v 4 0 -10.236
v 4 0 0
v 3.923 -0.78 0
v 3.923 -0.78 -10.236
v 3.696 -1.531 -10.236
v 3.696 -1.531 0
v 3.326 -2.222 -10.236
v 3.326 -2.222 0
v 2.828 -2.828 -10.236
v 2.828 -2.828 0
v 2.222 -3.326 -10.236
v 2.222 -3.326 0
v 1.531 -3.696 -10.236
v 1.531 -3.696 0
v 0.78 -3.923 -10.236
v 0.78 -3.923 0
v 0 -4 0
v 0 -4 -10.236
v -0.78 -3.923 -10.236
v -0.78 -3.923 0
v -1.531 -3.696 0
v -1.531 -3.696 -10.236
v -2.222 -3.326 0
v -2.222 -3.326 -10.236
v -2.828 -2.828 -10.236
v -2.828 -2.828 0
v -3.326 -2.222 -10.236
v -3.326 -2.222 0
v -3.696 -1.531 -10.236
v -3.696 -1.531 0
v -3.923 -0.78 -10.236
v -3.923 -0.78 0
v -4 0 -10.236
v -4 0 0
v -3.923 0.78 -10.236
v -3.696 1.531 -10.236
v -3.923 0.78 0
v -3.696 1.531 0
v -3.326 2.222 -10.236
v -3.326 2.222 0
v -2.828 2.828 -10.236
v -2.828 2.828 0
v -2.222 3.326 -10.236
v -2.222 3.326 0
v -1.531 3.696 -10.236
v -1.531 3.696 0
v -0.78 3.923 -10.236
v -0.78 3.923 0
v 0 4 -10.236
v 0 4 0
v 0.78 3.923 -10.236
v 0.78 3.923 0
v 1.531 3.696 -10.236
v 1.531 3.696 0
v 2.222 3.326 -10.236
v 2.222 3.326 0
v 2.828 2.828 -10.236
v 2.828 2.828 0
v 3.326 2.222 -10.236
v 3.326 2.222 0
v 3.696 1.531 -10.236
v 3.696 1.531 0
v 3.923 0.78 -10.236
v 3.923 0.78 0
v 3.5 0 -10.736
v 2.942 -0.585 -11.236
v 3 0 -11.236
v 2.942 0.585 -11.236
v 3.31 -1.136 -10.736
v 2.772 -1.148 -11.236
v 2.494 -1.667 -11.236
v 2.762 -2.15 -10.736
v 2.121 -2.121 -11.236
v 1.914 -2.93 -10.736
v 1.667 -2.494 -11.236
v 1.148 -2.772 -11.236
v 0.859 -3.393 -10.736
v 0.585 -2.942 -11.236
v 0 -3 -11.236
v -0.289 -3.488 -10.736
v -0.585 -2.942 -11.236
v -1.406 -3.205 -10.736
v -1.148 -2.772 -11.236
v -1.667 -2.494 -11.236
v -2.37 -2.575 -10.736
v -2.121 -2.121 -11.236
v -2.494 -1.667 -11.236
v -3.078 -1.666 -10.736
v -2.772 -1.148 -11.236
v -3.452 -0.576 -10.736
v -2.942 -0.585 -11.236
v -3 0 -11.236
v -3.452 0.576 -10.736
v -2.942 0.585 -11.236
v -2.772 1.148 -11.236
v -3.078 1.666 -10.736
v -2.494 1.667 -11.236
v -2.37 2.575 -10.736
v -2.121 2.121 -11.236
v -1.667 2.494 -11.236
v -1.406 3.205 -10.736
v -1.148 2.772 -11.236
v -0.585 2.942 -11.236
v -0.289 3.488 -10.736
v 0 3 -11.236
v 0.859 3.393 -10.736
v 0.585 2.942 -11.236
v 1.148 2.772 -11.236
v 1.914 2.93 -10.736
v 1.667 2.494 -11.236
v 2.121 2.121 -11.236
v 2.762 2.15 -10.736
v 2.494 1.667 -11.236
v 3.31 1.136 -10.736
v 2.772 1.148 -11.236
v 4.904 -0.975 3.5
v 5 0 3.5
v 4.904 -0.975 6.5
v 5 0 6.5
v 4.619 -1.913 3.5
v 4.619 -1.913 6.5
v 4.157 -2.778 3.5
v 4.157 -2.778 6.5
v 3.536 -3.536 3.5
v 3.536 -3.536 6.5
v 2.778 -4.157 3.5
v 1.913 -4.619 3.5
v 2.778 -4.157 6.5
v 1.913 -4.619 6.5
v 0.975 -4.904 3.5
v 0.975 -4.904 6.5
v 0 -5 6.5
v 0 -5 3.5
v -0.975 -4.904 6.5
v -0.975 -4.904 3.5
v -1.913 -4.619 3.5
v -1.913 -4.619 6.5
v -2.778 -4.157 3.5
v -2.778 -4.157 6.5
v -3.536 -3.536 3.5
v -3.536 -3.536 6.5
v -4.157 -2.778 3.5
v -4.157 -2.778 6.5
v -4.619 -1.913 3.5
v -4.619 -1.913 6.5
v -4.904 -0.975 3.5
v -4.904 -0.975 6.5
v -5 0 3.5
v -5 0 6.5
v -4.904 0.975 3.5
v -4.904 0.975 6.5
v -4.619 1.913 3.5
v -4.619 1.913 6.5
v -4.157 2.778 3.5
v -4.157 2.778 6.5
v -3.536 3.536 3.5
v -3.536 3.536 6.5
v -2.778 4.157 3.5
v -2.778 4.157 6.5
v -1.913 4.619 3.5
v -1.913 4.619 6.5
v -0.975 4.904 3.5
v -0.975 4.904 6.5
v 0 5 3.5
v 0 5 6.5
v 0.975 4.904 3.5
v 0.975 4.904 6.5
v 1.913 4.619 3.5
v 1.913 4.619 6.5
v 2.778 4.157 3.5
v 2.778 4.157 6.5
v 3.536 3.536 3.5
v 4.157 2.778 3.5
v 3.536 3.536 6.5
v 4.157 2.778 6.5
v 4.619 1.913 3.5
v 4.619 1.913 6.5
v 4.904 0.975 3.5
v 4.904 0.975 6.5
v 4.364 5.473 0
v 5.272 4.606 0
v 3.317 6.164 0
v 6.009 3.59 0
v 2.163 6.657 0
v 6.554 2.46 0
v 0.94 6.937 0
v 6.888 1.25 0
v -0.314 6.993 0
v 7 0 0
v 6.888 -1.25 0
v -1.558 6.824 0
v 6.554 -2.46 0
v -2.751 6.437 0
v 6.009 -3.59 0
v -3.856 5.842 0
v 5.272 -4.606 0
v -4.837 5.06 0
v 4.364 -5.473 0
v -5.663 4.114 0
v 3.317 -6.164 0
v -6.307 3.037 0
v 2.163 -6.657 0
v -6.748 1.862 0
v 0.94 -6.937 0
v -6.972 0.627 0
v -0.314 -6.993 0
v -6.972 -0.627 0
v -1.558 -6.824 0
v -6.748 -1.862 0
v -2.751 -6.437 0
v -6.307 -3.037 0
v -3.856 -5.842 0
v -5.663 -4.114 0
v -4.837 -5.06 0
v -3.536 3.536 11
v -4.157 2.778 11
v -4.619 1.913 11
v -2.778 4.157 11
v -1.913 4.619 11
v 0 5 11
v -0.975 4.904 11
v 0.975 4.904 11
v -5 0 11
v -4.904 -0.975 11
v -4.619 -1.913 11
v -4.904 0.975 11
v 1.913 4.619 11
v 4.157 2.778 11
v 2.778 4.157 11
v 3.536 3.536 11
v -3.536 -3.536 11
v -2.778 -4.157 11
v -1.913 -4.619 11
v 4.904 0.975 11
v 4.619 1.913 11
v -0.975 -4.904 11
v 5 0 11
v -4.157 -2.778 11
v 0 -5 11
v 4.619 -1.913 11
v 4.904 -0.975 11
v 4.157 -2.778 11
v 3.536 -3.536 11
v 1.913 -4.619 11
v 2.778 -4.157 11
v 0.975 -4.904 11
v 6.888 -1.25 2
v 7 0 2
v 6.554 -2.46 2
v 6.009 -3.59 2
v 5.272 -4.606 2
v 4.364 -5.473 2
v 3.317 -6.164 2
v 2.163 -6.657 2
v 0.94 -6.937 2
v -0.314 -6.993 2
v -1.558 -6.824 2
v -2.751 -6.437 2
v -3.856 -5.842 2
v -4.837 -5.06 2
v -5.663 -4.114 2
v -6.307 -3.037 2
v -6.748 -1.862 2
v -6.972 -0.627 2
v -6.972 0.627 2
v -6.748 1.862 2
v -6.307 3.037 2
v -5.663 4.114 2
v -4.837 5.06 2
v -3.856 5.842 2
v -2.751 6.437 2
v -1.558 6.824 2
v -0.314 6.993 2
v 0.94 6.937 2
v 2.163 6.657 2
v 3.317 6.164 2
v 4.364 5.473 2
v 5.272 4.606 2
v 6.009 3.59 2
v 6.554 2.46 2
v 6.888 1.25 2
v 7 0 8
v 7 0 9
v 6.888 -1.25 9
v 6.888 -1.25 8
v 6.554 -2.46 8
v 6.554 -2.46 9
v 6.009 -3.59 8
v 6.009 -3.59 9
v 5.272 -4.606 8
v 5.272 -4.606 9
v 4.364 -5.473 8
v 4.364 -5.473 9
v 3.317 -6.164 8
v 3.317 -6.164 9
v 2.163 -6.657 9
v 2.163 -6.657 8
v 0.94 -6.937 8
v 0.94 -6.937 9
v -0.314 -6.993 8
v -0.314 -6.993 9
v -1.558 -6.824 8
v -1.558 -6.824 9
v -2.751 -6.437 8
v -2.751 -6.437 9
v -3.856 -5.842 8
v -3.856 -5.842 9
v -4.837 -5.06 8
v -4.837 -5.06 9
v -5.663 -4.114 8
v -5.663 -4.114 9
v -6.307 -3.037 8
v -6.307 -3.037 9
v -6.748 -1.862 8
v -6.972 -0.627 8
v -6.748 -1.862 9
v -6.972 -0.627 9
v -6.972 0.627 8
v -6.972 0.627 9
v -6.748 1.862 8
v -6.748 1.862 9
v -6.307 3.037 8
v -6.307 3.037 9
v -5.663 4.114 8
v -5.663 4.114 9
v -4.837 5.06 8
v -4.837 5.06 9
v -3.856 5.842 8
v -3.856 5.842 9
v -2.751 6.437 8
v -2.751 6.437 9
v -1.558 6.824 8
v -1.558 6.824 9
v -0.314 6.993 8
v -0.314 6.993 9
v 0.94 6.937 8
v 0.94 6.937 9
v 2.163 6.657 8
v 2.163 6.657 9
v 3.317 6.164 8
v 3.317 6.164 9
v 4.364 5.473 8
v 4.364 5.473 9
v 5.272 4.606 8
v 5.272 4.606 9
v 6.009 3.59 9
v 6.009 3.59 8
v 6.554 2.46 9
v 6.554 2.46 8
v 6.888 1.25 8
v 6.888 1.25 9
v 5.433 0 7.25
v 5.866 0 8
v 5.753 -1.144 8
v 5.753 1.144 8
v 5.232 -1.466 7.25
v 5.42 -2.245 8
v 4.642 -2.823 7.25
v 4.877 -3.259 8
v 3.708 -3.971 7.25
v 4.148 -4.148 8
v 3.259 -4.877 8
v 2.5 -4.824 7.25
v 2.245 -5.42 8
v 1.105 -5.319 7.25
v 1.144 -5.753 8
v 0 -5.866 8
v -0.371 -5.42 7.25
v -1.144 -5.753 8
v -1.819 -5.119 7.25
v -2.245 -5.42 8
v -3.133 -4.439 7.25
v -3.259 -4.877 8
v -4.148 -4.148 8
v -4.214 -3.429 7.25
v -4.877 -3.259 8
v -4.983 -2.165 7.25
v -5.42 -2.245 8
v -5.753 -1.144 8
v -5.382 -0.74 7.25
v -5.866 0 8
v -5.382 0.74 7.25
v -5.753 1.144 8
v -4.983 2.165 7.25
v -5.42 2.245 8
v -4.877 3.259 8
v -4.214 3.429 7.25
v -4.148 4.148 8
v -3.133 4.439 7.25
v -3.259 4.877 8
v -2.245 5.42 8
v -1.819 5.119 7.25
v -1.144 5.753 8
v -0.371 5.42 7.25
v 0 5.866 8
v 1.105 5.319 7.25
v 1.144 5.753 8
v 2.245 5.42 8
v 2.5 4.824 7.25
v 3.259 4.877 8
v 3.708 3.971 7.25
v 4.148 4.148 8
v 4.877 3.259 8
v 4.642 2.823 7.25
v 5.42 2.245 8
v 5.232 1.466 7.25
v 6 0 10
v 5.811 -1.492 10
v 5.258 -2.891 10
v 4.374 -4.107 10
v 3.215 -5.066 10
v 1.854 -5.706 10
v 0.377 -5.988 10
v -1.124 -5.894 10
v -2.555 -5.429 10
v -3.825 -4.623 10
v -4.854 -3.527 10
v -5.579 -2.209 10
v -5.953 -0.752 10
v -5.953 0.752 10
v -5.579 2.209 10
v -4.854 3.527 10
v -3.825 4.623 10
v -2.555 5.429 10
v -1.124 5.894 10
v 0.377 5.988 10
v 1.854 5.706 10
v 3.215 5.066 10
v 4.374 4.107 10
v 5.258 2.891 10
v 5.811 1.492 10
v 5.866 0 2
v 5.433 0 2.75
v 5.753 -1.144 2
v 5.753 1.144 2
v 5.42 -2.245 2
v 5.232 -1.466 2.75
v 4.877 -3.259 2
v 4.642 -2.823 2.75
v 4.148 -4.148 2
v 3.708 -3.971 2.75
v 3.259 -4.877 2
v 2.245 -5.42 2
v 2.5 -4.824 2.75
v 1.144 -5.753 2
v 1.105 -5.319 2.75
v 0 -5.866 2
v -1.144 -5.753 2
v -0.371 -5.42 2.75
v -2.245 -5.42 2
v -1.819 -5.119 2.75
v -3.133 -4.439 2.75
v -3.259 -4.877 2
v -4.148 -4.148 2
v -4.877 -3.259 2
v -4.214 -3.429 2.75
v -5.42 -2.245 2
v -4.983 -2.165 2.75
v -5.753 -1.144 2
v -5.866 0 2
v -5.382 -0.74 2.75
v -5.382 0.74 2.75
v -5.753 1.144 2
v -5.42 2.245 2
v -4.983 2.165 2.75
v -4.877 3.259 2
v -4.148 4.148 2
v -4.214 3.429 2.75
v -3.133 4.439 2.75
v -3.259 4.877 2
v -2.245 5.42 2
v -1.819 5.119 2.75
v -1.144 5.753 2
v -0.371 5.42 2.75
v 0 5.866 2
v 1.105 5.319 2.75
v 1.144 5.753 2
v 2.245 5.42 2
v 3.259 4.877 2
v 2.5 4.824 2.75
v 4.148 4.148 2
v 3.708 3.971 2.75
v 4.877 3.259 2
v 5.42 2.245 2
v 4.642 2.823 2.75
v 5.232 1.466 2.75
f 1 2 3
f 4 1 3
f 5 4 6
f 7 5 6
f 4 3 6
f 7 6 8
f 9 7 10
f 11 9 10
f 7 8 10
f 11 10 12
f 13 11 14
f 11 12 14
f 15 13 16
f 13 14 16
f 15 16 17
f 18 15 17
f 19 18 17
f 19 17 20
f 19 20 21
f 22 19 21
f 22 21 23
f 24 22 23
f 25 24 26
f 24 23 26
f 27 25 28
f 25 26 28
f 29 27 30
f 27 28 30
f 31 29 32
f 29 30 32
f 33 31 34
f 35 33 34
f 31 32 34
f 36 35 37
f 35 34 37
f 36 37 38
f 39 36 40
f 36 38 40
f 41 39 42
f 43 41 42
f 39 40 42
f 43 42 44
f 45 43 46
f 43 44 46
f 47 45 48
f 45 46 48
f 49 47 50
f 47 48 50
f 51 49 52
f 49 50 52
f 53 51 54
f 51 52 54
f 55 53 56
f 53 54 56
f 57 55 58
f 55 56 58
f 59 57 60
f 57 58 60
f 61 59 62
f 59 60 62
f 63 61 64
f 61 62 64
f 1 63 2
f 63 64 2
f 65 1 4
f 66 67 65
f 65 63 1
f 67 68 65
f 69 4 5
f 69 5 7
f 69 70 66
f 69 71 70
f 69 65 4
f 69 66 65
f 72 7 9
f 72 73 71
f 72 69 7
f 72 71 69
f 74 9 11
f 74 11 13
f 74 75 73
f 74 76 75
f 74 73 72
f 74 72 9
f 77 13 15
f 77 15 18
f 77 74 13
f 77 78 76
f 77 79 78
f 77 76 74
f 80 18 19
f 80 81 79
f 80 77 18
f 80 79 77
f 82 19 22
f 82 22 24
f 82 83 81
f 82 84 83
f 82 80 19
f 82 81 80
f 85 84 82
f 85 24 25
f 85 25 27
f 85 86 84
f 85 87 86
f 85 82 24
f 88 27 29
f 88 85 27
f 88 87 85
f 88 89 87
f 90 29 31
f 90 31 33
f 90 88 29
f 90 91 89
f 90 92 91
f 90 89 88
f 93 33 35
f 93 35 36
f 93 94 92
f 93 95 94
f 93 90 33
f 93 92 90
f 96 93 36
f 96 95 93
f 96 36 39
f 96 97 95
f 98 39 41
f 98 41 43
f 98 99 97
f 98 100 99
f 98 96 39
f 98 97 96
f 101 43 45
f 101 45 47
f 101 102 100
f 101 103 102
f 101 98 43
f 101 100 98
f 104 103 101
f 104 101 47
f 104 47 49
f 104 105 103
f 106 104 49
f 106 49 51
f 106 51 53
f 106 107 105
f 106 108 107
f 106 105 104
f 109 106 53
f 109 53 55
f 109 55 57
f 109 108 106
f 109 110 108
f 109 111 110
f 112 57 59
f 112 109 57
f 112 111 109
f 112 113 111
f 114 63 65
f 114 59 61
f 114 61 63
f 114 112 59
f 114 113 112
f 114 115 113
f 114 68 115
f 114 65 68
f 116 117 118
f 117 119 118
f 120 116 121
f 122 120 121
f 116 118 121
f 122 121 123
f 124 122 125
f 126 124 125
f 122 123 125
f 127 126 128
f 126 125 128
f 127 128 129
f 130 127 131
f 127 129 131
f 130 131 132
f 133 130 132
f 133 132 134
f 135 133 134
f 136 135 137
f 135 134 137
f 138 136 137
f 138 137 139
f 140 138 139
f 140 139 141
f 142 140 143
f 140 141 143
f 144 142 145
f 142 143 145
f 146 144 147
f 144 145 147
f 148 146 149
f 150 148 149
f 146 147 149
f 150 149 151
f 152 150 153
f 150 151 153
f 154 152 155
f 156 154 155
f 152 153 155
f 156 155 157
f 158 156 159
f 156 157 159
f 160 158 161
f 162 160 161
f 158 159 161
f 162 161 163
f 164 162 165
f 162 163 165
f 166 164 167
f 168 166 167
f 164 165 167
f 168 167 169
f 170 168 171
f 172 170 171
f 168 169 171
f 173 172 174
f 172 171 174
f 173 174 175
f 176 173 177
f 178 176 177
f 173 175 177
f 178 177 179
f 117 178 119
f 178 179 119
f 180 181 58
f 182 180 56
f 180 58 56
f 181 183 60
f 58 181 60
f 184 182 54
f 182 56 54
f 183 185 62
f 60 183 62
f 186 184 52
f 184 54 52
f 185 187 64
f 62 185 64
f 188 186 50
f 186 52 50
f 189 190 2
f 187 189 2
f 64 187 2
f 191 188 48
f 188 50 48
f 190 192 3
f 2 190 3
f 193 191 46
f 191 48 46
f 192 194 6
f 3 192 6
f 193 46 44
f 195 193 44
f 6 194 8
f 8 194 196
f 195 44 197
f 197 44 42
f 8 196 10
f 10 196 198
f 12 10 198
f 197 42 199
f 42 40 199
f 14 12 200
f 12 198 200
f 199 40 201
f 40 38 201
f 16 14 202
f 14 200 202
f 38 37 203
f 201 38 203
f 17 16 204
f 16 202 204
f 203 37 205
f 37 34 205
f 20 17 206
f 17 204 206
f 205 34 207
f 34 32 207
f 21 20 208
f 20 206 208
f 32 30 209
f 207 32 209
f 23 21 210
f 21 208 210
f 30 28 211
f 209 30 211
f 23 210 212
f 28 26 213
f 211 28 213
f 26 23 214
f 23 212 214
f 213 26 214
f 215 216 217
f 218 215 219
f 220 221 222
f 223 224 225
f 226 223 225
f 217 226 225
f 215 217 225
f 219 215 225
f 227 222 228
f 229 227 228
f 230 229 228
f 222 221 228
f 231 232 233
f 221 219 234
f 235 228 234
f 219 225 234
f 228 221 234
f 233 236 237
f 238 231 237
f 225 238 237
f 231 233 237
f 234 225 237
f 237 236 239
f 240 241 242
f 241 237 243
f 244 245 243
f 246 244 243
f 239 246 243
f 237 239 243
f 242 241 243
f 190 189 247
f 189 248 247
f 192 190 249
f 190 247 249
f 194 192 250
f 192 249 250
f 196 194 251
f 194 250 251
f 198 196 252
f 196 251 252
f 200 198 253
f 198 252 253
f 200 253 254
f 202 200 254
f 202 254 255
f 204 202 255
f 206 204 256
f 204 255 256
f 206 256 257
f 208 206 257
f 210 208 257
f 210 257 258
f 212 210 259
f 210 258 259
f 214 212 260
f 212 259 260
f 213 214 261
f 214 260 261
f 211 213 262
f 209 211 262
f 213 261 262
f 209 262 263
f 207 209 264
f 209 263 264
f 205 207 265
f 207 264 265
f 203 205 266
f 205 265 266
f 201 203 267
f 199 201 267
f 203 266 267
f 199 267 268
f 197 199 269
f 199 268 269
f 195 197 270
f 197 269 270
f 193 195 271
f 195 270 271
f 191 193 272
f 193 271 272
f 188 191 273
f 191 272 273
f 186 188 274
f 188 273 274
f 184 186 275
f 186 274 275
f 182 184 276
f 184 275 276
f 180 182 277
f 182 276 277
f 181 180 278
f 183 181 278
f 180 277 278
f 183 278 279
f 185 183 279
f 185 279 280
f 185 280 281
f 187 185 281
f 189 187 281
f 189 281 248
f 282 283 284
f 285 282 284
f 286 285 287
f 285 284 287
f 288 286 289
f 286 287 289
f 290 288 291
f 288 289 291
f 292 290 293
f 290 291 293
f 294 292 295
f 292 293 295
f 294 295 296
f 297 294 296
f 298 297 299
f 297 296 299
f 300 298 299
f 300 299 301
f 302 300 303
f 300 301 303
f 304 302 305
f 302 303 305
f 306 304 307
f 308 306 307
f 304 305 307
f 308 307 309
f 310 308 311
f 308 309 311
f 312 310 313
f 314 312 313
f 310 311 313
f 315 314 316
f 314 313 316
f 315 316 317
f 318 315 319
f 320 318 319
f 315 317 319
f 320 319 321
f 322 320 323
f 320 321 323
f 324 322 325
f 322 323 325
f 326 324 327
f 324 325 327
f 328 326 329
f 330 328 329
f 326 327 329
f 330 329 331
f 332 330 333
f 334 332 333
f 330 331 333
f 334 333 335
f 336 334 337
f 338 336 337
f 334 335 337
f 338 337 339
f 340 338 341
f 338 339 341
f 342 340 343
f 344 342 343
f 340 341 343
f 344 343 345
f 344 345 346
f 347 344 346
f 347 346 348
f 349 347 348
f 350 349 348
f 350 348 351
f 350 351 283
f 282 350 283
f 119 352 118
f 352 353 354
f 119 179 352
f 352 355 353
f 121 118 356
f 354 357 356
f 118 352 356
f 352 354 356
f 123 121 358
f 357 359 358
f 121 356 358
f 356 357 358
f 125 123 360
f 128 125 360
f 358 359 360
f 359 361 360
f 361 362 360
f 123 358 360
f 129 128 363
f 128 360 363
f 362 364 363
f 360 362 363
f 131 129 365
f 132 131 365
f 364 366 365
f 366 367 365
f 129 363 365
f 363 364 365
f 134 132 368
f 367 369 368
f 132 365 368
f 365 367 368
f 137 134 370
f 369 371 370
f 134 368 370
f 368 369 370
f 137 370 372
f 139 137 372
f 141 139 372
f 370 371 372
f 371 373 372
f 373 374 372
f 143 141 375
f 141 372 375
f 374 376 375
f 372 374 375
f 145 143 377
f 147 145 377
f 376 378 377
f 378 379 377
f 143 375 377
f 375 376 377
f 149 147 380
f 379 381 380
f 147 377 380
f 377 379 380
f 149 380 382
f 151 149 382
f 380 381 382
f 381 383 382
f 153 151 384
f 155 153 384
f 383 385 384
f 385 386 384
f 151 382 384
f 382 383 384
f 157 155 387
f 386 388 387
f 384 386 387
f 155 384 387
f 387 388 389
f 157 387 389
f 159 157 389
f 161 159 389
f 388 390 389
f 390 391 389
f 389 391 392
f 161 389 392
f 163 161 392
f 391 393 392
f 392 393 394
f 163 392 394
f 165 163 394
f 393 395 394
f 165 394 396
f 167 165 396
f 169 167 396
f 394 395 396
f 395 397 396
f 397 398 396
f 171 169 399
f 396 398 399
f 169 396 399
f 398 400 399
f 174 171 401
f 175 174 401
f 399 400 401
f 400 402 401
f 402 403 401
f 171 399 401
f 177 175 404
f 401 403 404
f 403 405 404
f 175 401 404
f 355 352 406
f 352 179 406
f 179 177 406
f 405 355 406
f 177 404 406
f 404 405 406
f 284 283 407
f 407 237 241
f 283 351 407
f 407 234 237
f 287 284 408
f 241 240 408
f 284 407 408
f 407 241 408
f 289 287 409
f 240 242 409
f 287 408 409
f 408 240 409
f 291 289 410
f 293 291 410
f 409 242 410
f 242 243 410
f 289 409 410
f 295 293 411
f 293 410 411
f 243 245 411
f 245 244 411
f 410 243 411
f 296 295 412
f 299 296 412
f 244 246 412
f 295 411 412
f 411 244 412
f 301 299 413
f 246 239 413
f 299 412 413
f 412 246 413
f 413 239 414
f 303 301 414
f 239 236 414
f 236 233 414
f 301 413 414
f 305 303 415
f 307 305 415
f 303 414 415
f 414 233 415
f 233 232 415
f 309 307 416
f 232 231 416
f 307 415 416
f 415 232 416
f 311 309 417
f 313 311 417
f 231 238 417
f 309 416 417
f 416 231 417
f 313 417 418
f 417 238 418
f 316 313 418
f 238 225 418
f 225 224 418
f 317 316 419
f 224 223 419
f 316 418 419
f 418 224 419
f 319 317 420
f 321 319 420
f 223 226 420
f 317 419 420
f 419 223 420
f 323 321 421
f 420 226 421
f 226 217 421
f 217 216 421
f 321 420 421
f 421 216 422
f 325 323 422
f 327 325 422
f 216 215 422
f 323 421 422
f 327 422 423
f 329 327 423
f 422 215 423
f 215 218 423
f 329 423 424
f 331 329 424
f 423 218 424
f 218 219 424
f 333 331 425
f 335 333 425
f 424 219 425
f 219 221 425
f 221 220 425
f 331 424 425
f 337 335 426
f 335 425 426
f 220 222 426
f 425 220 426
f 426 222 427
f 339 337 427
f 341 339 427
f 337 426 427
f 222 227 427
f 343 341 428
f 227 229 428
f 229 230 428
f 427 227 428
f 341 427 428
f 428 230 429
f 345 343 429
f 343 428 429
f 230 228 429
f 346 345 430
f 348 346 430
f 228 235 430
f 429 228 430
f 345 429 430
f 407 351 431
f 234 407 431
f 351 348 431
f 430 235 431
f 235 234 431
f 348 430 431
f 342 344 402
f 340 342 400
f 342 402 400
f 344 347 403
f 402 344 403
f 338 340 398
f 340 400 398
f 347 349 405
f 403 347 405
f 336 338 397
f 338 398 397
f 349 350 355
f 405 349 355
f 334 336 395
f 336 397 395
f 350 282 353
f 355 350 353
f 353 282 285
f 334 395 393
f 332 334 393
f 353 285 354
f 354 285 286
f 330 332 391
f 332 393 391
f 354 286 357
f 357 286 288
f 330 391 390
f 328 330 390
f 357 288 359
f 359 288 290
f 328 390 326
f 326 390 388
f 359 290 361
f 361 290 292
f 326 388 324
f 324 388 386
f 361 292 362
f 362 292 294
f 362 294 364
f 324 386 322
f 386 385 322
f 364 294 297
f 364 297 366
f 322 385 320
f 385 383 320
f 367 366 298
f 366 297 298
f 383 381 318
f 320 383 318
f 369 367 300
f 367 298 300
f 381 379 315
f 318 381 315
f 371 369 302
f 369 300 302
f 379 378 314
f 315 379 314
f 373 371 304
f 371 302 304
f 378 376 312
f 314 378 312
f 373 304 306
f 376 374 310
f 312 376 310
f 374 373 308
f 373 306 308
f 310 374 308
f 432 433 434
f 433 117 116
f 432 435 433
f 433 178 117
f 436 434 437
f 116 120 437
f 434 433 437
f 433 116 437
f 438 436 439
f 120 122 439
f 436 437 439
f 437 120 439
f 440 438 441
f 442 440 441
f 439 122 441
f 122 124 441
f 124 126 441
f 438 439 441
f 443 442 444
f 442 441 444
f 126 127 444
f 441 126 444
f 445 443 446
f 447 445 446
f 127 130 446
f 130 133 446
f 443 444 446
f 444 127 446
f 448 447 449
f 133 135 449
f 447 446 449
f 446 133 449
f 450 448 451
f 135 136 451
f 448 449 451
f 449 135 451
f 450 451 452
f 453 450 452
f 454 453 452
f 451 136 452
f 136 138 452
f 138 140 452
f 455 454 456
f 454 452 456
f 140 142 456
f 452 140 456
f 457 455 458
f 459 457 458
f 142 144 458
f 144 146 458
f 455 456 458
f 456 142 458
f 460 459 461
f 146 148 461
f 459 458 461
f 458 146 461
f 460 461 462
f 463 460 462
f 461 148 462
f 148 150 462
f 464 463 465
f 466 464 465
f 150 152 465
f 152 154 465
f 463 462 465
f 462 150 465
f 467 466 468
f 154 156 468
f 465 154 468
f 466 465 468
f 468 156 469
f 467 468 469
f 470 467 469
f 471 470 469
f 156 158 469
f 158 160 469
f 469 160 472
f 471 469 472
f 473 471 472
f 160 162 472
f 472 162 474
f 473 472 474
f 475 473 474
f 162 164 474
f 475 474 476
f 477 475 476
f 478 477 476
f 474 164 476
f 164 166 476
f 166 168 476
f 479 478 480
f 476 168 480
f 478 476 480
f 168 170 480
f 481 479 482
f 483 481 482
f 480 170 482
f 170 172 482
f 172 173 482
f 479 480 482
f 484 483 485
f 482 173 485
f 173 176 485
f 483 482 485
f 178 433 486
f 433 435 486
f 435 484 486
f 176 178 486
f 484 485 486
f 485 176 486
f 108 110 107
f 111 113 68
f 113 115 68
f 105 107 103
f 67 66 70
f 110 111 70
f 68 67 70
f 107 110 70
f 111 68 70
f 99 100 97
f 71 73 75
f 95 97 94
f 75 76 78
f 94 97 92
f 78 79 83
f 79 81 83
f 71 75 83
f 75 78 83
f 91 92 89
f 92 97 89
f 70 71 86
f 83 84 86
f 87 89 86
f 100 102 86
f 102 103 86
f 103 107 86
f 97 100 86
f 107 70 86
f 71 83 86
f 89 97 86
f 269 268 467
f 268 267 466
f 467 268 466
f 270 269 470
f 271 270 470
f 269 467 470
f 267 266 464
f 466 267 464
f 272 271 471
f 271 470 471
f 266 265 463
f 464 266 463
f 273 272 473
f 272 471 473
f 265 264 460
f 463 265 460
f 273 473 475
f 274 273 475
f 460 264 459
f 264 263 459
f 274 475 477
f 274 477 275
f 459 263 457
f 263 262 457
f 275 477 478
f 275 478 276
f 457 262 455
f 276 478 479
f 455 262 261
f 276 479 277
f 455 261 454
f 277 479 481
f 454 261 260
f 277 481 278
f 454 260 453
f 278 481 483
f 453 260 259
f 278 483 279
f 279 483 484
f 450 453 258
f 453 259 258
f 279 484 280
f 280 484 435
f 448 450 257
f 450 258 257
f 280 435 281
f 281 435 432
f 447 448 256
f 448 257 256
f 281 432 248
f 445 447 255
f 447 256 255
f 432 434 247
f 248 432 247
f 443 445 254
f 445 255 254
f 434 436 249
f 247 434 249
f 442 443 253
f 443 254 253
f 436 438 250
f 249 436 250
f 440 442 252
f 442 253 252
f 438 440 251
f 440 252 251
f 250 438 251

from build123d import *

# Parameters (mm, degrees)
F2_SIZE = 2
F3_SIZE = 1


with BuildPart() as f1:
    # F0 (on Front) → F1 (revolve)
    with BuildSketch(Plane.XZ):
        Polygon((0, 11), (0, -11.235857), (4, -11.235857), (4, 0), (7, 0), (7, 2), (5.866025, 2), (5, 3.5), (5, 6.5), (5.866025, 8), (7, 8), (7, 11), align=None)
    revolve(axis=Axis((0, 0, -0.117929), (0, 0, -1)))

    # F2
    f2_edges = [f1.edges().sort_by_distance(p)[0] for p in [
        (-7, 0, 11),
    ]]
    chamfer(f2_edges, length=F2_SIZE)

    # F3
    f3_edges = [f1.edges().sort_by_distance(p)[0] for p in [
        (-4, 0, -11.235857),
    ]]
    chamfer(f3_edges, length=F3_SIZE)


solid = f1.part
